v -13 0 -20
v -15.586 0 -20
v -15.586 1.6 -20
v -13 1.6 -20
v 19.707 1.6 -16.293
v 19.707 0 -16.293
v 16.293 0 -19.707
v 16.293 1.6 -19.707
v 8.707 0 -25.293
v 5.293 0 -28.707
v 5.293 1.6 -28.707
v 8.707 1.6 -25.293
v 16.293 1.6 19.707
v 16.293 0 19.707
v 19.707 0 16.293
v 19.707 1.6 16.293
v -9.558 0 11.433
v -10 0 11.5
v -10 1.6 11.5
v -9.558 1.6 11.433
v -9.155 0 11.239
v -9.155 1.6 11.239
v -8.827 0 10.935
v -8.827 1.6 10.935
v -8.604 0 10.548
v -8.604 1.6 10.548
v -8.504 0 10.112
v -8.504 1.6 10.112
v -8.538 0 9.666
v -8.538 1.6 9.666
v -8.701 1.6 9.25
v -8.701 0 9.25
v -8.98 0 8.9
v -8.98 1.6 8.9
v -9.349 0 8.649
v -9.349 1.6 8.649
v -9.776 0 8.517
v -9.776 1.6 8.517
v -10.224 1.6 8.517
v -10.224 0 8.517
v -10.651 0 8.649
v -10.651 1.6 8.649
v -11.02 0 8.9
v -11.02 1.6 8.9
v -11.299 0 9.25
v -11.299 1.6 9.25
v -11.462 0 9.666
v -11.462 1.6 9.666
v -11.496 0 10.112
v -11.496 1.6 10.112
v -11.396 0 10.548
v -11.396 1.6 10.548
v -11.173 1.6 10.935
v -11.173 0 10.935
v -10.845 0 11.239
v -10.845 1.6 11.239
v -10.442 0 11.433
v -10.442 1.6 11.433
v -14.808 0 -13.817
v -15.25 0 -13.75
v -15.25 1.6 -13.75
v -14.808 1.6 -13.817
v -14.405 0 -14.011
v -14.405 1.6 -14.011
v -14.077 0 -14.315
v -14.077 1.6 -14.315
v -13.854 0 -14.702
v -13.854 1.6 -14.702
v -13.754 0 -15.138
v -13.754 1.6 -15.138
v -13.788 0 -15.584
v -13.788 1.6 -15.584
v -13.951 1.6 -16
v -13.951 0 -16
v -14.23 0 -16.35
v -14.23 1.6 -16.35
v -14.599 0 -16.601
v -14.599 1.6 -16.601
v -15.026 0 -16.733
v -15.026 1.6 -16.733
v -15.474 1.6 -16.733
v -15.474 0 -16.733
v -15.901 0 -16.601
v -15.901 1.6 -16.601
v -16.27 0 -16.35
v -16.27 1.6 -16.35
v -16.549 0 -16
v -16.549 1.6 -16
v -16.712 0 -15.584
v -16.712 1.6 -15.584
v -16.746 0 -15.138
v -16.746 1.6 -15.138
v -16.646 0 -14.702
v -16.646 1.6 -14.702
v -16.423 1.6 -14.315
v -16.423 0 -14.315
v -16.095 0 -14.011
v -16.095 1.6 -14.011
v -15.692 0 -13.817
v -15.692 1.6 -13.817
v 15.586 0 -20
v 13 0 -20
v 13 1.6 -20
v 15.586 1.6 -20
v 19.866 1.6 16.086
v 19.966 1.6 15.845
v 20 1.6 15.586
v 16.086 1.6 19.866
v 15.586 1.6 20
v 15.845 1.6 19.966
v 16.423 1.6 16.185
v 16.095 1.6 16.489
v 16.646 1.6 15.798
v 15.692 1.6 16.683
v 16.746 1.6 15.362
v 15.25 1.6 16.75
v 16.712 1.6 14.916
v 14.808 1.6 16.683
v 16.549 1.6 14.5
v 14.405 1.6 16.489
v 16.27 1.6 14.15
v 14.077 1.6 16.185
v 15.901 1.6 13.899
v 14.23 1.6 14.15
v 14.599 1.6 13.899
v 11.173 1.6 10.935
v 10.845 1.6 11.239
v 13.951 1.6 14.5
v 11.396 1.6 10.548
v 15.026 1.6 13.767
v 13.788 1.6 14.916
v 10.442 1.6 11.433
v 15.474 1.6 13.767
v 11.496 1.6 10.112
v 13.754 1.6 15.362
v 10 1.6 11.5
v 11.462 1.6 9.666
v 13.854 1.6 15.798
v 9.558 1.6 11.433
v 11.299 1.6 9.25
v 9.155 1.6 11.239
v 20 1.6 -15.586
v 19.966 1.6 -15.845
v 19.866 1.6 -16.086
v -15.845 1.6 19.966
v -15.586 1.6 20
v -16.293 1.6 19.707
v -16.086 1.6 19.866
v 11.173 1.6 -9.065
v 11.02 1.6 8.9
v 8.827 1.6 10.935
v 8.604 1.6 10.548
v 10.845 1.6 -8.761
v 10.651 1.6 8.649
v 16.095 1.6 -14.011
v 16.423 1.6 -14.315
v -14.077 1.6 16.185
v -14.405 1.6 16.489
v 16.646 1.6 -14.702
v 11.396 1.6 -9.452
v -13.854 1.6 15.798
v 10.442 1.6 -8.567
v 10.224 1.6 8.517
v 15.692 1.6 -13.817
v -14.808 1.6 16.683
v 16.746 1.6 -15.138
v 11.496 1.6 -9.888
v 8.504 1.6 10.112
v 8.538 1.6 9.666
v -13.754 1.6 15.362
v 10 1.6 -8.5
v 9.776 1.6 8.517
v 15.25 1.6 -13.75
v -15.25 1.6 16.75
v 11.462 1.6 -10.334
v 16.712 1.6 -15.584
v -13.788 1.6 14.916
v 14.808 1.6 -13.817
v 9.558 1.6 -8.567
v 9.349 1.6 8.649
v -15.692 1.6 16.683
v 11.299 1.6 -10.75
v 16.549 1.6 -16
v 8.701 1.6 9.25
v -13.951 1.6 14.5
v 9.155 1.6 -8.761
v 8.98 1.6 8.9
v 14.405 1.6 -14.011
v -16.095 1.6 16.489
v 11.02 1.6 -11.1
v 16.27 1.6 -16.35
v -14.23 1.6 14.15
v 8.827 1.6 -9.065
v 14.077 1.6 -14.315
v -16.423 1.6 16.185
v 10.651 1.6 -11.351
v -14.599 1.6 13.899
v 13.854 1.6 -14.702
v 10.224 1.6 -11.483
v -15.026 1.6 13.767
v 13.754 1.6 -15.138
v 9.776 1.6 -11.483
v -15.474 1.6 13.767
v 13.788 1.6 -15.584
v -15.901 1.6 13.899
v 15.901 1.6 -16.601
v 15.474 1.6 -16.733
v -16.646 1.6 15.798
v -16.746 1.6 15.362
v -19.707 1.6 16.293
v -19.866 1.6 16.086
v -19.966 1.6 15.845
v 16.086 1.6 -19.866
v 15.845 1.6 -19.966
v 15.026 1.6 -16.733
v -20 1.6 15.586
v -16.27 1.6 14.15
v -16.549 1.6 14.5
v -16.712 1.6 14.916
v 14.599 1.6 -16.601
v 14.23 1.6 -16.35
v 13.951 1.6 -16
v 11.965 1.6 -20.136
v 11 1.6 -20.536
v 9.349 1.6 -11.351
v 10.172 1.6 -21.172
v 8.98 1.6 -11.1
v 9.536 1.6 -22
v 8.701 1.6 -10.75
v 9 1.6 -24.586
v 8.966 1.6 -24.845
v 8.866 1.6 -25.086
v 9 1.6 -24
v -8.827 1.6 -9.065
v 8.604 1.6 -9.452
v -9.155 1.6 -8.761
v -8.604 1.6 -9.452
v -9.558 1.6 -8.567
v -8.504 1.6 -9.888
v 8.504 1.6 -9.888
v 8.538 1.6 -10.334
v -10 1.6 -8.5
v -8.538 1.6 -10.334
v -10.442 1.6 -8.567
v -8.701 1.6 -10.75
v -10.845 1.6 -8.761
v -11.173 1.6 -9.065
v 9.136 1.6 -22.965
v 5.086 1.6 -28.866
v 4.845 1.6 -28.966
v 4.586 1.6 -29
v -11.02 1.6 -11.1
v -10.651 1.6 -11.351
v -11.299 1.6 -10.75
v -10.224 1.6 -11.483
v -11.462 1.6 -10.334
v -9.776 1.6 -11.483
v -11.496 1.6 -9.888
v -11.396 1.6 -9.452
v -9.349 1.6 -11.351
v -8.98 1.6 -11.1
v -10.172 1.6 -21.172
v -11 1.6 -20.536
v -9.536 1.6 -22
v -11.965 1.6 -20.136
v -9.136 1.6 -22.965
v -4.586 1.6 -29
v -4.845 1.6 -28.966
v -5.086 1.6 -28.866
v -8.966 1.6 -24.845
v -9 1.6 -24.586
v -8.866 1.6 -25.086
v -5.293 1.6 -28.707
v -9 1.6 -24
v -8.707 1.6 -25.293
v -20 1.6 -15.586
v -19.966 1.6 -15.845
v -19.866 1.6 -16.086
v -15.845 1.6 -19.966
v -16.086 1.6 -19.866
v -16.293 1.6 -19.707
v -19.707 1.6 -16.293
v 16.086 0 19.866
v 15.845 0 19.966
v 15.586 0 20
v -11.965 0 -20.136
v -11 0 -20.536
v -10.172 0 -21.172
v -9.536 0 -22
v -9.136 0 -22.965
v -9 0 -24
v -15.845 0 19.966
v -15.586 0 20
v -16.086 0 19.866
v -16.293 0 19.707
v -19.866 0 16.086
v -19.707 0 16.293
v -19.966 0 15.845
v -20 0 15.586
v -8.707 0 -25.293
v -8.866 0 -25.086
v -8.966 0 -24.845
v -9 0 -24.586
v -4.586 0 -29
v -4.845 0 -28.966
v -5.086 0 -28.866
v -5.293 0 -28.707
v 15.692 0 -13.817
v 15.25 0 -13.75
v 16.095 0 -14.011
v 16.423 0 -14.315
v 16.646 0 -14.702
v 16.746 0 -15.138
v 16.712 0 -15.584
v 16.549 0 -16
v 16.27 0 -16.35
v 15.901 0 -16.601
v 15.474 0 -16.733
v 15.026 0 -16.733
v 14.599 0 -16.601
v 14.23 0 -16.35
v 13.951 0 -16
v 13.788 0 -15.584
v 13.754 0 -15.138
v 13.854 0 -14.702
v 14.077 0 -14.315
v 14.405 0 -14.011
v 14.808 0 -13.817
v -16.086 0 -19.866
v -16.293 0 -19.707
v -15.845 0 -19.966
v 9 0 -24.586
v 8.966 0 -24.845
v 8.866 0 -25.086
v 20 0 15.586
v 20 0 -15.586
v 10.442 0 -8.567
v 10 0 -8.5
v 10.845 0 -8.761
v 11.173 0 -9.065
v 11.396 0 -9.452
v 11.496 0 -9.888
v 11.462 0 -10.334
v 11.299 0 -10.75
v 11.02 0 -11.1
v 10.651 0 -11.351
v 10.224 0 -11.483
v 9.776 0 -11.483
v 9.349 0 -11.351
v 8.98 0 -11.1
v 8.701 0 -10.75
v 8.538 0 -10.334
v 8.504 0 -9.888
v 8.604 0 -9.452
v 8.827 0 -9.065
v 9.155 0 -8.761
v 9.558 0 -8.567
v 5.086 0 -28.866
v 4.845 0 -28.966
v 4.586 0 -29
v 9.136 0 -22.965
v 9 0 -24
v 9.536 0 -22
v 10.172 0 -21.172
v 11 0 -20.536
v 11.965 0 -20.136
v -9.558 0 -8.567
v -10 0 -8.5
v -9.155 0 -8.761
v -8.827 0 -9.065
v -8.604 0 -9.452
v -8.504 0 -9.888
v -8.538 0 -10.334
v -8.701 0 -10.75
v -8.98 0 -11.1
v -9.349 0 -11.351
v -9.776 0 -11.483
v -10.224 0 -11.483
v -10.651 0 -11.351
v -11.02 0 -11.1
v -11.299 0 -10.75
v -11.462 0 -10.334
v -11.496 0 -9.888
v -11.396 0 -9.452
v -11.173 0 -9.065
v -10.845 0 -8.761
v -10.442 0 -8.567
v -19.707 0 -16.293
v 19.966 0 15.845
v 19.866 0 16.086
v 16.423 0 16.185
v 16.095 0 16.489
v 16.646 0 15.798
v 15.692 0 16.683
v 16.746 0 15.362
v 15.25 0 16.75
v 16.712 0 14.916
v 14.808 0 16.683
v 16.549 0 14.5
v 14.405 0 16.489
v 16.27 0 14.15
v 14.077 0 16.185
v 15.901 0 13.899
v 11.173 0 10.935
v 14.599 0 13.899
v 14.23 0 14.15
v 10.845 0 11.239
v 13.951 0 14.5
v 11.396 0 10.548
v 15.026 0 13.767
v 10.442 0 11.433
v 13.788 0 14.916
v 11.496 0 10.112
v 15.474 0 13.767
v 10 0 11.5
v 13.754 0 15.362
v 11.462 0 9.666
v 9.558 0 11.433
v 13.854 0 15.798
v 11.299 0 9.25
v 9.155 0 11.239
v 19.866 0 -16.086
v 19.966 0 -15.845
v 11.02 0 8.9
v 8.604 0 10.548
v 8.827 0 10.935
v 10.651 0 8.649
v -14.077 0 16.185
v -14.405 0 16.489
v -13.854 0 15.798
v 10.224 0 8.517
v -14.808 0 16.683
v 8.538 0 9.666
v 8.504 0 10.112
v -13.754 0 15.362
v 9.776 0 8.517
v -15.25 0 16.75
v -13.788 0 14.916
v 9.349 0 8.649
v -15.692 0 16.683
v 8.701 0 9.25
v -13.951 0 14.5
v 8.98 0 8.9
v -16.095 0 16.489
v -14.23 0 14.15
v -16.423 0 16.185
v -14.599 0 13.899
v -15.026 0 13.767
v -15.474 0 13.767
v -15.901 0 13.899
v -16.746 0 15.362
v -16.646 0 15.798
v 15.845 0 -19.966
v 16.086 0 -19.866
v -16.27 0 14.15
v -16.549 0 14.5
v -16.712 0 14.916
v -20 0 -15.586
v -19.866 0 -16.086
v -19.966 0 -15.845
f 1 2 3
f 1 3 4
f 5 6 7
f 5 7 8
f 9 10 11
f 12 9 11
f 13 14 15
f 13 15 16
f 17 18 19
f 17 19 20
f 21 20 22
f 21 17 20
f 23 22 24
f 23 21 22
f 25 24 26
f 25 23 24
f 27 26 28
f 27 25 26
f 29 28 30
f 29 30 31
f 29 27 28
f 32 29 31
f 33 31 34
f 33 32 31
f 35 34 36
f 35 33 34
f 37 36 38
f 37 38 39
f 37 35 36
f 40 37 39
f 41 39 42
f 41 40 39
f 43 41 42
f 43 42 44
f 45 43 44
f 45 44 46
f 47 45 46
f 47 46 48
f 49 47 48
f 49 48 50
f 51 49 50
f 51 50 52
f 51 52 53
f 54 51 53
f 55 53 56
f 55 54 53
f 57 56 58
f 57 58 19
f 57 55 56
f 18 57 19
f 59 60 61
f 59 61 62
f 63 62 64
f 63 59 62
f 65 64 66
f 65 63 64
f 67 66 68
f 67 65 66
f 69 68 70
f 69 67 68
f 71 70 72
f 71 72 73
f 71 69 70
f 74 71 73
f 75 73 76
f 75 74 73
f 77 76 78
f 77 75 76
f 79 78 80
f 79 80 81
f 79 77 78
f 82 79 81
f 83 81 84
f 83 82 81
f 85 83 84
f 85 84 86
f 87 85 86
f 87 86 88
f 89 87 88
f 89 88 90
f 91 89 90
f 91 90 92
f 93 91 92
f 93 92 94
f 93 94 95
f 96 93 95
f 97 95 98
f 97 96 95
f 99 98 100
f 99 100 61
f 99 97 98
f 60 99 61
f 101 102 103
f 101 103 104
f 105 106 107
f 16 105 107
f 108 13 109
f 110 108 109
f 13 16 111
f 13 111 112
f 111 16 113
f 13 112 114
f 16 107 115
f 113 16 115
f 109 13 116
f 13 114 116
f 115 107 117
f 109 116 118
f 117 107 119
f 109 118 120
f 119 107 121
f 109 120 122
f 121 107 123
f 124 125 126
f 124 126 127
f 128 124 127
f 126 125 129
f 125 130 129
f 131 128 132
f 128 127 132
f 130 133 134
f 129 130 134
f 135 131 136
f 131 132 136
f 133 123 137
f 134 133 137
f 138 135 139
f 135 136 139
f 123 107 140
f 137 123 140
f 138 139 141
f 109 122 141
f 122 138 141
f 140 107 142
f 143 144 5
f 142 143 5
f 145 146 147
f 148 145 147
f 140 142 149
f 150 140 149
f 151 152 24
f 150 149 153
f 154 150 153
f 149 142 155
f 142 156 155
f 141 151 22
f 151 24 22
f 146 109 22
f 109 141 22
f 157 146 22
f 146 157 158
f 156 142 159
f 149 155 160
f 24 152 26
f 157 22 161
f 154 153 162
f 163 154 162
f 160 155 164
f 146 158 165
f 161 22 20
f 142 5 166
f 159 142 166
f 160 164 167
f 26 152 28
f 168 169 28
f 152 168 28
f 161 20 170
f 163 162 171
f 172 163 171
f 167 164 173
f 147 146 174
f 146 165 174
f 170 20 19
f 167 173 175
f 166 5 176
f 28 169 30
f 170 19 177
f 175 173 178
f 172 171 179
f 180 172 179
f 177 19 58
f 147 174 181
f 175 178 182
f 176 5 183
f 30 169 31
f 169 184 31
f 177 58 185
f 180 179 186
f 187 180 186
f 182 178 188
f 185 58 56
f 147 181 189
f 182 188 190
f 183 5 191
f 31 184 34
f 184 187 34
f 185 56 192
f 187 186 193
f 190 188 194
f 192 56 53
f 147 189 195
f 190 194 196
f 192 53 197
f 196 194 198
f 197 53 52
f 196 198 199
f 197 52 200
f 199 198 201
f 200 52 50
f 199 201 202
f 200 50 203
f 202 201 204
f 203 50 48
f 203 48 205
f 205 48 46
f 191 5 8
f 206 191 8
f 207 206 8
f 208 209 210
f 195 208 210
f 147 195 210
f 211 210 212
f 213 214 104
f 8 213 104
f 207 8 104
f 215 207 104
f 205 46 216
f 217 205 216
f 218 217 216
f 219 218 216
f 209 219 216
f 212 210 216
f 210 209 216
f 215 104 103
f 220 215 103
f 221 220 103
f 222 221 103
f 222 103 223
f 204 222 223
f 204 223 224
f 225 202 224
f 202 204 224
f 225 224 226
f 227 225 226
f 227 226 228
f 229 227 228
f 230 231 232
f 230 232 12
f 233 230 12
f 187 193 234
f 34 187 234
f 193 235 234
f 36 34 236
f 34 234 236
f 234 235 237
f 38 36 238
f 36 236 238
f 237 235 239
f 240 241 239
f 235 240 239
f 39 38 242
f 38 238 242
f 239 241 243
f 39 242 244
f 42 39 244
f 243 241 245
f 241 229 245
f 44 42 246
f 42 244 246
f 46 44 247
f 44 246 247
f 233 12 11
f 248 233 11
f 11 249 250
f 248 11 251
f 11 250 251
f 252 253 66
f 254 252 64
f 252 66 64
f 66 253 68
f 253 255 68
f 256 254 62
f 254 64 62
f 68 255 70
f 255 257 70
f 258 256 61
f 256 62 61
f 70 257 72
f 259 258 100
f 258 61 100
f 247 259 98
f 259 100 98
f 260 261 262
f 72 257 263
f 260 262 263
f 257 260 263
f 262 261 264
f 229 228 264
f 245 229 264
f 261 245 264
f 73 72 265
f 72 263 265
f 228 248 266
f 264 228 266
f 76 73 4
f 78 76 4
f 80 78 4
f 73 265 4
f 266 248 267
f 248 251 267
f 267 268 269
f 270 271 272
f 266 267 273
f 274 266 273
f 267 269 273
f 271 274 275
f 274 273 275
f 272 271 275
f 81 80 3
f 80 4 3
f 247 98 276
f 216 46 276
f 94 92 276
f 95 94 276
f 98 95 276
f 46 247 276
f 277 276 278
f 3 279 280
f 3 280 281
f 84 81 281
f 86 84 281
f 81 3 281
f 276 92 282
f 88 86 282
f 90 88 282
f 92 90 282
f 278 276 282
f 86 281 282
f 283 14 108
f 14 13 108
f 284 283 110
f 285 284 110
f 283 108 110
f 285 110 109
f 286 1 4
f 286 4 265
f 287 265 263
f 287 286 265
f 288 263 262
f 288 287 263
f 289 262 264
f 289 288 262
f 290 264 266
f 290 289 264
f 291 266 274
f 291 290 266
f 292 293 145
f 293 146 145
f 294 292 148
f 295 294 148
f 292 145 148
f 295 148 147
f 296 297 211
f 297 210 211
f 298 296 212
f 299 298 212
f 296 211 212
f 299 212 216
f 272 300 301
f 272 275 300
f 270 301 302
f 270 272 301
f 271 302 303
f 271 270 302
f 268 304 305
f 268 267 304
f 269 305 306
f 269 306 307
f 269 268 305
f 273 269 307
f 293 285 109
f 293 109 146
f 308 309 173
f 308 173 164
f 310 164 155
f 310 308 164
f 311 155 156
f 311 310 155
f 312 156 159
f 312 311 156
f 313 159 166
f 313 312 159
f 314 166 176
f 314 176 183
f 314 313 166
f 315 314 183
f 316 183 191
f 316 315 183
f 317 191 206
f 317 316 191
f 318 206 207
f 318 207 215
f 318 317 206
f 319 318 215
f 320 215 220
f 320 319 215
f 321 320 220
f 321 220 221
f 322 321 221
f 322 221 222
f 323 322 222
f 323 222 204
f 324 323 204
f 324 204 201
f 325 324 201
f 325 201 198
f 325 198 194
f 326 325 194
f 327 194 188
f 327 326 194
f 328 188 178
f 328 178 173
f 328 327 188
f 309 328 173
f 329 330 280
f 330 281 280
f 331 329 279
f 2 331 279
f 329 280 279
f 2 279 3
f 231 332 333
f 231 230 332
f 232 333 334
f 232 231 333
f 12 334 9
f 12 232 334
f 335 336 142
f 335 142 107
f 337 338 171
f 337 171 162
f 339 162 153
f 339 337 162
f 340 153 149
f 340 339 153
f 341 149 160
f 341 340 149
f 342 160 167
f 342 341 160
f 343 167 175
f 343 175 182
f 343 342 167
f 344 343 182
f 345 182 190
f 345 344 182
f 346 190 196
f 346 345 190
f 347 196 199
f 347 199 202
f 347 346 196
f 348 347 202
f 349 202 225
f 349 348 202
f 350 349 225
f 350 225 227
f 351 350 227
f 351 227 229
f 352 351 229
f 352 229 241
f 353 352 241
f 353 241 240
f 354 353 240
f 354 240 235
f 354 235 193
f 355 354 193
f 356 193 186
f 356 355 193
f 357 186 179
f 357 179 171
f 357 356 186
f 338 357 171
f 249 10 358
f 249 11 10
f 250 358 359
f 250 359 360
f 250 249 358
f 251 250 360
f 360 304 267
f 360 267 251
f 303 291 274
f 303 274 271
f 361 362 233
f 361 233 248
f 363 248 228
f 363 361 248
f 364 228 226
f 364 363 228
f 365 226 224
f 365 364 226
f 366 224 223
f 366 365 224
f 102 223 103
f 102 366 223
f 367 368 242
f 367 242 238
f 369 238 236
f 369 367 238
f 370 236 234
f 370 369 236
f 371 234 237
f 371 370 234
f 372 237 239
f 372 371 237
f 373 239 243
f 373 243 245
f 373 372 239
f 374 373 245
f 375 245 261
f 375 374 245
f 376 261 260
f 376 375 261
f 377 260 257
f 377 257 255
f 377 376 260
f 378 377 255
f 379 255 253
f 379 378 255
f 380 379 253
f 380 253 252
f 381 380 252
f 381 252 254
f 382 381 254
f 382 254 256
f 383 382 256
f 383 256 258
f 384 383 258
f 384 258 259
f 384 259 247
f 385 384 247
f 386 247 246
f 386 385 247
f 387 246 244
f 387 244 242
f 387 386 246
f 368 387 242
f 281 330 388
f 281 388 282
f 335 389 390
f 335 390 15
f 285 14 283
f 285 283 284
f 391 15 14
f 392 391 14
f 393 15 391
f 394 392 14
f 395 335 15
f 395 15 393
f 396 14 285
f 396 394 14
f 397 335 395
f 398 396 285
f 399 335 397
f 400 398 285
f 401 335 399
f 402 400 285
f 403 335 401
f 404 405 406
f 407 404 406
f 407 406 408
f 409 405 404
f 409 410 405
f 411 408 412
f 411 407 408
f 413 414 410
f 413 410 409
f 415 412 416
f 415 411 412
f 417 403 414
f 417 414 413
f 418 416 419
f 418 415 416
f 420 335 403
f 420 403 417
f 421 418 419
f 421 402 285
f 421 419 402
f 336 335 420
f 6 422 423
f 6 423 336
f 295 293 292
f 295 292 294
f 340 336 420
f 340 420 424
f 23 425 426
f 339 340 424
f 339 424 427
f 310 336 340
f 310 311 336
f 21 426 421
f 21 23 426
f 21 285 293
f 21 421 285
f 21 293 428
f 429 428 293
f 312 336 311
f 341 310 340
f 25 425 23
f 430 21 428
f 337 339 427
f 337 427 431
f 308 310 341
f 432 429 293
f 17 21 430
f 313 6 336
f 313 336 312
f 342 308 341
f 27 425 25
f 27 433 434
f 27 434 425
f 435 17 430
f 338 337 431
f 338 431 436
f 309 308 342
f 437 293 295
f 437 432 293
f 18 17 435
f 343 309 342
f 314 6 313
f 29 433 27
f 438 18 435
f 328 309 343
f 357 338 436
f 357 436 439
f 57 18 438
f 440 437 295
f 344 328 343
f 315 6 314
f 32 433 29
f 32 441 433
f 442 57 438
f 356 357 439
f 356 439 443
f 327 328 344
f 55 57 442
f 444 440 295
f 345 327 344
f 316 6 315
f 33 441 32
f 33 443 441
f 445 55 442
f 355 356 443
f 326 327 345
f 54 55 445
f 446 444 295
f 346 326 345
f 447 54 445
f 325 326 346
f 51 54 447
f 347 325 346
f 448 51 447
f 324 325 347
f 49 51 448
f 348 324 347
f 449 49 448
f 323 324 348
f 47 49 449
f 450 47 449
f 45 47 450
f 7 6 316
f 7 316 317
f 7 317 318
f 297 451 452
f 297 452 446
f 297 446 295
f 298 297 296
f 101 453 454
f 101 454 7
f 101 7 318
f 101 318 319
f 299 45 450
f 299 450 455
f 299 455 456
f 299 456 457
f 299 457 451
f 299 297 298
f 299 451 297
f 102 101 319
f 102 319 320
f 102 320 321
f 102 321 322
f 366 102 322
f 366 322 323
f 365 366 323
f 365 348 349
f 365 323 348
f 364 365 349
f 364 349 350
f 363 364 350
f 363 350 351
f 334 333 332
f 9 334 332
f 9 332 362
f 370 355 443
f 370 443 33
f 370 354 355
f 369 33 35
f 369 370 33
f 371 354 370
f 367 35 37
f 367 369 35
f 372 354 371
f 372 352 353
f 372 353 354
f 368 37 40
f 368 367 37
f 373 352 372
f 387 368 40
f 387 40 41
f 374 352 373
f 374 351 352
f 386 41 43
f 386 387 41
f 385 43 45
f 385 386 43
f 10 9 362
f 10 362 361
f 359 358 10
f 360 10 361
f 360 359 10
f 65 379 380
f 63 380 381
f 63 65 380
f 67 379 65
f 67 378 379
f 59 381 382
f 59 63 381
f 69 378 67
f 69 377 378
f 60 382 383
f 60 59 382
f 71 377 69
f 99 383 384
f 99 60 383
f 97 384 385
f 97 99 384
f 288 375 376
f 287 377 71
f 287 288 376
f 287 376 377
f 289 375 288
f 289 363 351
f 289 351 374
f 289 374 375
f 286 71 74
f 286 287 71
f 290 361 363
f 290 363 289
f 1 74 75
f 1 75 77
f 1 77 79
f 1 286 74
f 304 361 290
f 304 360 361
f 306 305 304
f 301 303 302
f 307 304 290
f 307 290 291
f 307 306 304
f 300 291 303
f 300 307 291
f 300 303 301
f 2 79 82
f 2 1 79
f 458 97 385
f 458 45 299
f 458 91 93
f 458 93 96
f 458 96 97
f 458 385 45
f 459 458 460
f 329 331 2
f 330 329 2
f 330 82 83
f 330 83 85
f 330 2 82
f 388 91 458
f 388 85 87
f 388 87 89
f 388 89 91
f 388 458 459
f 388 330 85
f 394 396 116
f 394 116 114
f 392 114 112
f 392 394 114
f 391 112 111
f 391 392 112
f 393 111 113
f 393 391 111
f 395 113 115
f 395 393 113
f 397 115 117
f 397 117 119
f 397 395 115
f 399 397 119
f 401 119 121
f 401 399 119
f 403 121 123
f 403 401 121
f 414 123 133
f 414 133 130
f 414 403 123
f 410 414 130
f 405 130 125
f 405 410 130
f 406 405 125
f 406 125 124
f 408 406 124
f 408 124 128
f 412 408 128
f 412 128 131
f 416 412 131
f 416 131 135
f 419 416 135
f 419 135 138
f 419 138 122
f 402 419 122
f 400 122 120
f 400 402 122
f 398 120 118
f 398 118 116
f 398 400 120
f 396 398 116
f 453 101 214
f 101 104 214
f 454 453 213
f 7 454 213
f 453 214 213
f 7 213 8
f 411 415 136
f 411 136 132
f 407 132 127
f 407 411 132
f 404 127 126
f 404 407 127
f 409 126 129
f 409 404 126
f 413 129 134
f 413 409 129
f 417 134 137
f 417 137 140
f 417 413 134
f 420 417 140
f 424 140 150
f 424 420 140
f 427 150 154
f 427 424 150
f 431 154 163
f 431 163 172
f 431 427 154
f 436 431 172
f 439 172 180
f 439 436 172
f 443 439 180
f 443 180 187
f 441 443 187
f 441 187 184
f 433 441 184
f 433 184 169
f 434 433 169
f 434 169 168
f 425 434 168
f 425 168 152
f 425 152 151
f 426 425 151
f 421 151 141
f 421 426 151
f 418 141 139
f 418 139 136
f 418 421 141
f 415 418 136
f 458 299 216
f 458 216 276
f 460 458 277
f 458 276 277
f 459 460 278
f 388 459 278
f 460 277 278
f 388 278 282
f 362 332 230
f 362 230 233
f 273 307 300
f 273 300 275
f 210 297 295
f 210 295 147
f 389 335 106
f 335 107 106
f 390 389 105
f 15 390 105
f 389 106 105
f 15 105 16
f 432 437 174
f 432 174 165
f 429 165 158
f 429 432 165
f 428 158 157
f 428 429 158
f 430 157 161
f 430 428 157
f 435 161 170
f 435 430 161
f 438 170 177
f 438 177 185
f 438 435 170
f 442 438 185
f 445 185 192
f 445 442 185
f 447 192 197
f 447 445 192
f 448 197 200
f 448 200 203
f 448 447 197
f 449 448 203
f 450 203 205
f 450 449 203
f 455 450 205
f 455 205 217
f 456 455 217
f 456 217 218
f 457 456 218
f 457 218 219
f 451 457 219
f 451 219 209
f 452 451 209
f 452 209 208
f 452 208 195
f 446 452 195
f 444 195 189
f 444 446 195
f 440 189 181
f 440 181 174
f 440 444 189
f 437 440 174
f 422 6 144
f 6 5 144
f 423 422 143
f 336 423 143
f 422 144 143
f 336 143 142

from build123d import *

# Parameters (mm, degrees)
SKETCH1_R           = 1.5
BOSS_EXTRUDE1_DEPTH = 1.6
CHAMFER1_SIZE       = 4
FILLET1_R           = 1


with BuildPart() as part:
    # Sketch1 → Boss-Extrude1 (new body)
    with BuildSketch(Plane(origin=(0, 0, 0), x_dir=(1, 0, 0), z_dir=(0, 1, 0))):
        with BuildLine():
            Line((13, 20), (20, 20))
            Line((20, 20), (20, -20))
            Line((20, -20), (-20, -20))
            Line((-20, -20), (-20, 20))
            Line((-20, 20), (-13, 20))
            ThreePointArc((-13, 20), (-10.171572875, 21.171572875), (-9, 24))
            Line((-9, 24), (-9, 29))
            Line((-9, 29), (9, 29))
            Line((9, 29), (9, 24))
            ThreePointArc((9, 24), (10.171572875, 21.171572875), (13, 20))
        make_face()
        with Locations(Location((-15.25, 15.25, 0), (0, 0, 270))):
            Circle(SKETCH1_R, mode=Mode.SUBTRACT)
        with Locations(Location((-10, 10, 0), (0, 0, 270))):
            Circle(SKETCH1_R, mode=Mode.SUBTRACT)
        with Locations(Location((10, 10, 0), (0, 0, 270))):
            Circle(SKETCH1_R, mode=Mode.SUBTRACT)
        with Locations(Location((-10, -10, 0), (0, 0, 270))):
            Circle(SKETCH1_R, mode=Mode.SUBTRACT)
        with Locations(Location((-15.25, -15.25, 0), (0, 0, 270))):
            Circle(SKETCH1_R, mode=Mode.SUBTRACT)
        with Locations(Location((15.25, -15.25, 0), (0, 0, 270))):
            Circle(SKETCH1_R, mode=Mode.SUBTRACT)
        with Locations(Location((10, -10, 0), (0, 0, 270))):
            Circle(SKETCH1_R, mode=Mode.SUBTRACT)
        with Locations(Location((15.25, 15.25, 0), (0, 0, 270))):
            Circle(SKETCH1_R, mode=Mode.SUBTRACT)
    extrude(amount=BOSS_EXTRUDE1_DEPTH)

    # Chamfer1
    chamfer1_edges = [part.edges().sort_by_distance(p)[0] for p in [
        (20, 0.8, 20),
        (-20, 0.8, 20),
        (-20, 0.8, -20),
        (-9, 0.8, -29),
        (9, 0.8, -29),
        (20, 0.8, -20),
    ]]
    chamfer(chamfer1_edges, length=CHAMFER1_SIZE)

    # Fillet1
    fillet1_edges = [part.edges().sort_by_distance(p)[0] for p in [
        (-5, 0.8, -29),
        (5, 0.8, -29),
        (9, 0.8, -25),
        (-9, 0.8, -25),
        (-20, 0.8, 16),
        (-20, 0.8, -16),
        (-16, 0.8, -20),
        (16, 0.8, -20),
        (20, 0.8, 16),
        (20, 0.8, -16),
        (-16, 0.8, 20),
        (16, 0.8, 20),
    ]]
    fillet(fillet1_edges, radius=FILLET1_R)


solid = part.part
